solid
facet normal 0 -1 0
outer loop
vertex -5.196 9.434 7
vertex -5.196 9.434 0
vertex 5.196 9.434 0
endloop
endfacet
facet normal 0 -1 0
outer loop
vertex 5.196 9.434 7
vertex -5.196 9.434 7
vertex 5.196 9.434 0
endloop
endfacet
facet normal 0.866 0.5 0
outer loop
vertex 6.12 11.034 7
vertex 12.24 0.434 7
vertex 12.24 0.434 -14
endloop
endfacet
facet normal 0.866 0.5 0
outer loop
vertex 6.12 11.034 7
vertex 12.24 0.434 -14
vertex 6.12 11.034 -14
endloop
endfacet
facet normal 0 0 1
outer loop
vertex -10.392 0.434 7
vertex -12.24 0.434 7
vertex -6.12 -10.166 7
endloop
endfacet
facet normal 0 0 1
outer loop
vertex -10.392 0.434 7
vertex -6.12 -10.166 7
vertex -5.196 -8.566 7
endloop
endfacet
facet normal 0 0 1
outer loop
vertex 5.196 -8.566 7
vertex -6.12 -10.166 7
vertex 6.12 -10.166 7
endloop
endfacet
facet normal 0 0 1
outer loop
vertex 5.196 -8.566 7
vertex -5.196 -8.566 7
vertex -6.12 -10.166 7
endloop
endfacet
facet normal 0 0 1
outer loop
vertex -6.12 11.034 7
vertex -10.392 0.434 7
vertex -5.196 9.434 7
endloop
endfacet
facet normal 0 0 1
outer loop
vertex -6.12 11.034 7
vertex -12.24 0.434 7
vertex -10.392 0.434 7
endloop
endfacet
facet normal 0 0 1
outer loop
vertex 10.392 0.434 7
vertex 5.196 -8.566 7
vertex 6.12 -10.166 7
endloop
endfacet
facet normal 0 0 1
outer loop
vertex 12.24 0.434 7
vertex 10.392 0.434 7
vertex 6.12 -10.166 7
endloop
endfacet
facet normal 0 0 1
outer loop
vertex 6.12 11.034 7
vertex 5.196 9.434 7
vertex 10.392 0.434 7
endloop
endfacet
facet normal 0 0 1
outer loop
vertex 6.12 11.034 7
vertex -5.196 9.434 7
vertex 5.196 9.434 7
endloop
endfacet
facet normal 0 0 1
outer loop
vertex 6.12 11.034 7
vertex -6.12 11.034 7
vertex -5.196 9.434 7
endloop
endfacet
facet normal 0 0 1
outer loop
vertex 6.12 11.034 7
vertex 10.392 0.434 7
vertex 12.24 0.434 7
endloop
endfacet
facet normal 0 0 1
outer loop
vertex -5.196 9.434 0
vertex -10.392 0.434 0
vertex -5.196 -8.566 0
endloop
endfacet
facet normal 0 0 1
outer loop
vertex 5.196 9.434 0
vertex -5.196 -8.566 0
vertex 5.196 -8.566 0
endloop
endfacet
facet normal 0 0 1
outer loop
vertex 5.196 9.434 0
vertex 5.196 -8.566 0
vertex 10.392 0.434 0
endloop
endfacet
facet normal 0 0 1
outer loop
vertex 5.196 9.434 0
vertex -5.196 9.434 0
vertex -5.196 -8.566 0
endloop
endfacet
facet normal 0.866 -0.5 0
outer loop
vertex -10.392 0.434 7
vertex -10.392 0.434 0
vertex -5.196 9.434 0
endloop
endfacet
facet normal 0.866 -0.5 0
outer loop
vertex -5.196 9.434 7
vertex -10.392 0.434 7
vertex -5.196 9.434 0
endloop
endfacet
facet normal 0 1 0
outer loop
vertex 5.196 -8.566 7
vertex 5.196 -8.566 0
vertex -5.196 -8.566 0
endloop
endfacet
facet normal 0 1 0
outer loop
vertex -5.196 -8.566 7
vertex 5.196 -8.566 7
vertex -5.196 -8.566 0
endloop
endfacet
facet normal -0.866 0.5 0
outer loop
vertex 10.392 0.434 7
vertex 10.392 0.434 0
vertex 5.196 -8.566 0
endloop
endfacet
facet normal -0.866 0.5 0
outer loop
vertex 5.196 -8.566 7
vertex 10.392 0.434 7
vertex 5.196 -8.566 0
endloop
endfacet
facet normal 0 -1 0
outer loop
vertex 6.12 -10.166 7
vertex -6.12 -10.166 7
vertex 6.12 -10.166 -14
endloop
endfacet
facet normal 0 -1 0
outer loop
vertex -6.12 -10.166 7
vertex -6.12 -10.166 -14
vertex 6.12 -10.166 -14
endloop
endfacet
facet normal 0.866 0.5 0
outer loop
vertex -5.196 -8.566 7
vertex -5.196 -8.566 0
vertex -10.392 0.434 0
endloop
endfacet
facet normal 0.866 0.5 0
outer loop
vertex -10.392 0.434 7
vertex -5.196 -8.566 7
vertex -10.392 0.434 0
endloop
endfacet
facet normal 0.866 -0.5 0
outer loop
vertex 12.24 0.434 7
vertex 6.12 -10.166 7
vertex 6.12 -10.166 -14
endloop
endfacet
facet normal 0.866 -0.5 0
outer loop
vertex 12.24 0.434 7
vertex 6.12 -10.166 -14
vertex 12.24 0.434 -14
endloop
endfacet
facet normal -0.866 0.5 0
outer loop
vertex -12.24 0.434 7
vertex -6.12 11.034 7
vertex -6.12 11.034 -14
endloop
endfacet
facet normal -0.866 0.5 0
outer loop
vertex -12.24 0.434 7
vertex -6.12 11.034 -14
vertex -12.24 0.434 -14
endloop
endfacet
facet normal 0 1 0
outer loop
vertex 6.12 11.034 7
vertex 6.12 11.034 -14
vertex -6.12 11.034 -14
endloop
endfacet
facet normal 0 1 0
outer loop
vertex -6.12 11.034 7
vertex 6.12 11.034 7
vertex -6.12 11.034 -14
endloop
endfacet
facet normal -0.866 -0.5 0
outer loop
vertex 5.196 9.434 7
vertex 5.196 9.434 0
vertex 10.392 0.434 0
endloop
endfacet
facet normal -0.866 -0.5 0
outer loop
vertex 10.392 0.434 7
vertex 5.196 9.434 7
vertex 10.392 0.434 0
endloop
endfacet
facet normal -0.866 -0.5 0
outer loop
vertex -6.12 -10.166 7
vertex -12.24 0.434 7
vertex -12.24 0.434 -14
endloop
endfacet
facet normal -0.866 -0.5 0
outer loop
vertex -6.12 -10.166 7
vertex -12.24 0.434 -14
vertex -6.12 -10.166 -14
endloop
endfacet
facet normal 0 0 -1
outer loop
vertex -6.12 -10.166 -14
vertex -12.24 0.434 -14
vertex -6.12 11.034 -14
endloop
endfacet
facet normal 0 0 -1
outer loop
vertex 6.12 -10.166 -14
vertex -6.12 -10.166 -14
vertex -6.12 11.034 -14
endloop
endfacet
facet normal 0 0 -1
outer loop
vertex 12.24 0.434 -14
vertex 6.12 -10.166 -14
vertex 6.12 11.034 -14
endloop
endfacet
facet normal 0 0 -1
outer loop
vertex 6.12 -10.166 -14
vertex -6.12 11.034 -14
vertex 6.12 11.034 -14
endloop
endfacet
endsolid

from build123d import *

# Parameters (mm, degrees)
F1_DEPTH = 14
F2_DEPTH = 7


with BuildPart() as f1:
    # F0 (on Top) → F1 (new body)
    with BuildSketch(Plane.XY):
        Polygon((-12.239826, 0.433735), (-6.119913, -10.166265), (6.119913, -10.166265), (12.239826, 0.433735), (6.119913, 11.033735), (-6.119913, 11.033735), align=None)
        Polygon((10.392305, 0.433735), (5.196152, -8.566265), (-5.196152, -8.566265), (-10.392305, 0.433735), (-5.196152, 9.433735), (5.196152, 9.433735), align=None, mode=Mode.SUBTRACT)
        Polygon((-5.196152, -8.566265), (5.196152, -8.566265), (10.392305, 0.433735), (5.196152, 9.433735), (-5.196152, 9.433735), (-10.392305, 0.433735), align=None)
    extrude(amount=-F1_DEPTH)

    # F0 (on Top) → F2 (join)
    with BuildSketch(Plane.XY):
        Polygon((-12.239826, 0.433735), (-6.119913, -10.166265), (6.119913, -10.166265), (12.239826, 0.433735), (6.119913, 11.033735), (-6.119913, 11.033735), align=None)
        Polygon((10.392305, 0.433735), (5.196152, -8.566265), (-5.196152, -8.566265), (-10.392305, 0.433735), (-5.196152, 9.433735), (5.196152, 9.433735), align=None, mode=Mode.SUBTRACT)
    extrude(amount=F2_DEPTH)


solid = f1.part
